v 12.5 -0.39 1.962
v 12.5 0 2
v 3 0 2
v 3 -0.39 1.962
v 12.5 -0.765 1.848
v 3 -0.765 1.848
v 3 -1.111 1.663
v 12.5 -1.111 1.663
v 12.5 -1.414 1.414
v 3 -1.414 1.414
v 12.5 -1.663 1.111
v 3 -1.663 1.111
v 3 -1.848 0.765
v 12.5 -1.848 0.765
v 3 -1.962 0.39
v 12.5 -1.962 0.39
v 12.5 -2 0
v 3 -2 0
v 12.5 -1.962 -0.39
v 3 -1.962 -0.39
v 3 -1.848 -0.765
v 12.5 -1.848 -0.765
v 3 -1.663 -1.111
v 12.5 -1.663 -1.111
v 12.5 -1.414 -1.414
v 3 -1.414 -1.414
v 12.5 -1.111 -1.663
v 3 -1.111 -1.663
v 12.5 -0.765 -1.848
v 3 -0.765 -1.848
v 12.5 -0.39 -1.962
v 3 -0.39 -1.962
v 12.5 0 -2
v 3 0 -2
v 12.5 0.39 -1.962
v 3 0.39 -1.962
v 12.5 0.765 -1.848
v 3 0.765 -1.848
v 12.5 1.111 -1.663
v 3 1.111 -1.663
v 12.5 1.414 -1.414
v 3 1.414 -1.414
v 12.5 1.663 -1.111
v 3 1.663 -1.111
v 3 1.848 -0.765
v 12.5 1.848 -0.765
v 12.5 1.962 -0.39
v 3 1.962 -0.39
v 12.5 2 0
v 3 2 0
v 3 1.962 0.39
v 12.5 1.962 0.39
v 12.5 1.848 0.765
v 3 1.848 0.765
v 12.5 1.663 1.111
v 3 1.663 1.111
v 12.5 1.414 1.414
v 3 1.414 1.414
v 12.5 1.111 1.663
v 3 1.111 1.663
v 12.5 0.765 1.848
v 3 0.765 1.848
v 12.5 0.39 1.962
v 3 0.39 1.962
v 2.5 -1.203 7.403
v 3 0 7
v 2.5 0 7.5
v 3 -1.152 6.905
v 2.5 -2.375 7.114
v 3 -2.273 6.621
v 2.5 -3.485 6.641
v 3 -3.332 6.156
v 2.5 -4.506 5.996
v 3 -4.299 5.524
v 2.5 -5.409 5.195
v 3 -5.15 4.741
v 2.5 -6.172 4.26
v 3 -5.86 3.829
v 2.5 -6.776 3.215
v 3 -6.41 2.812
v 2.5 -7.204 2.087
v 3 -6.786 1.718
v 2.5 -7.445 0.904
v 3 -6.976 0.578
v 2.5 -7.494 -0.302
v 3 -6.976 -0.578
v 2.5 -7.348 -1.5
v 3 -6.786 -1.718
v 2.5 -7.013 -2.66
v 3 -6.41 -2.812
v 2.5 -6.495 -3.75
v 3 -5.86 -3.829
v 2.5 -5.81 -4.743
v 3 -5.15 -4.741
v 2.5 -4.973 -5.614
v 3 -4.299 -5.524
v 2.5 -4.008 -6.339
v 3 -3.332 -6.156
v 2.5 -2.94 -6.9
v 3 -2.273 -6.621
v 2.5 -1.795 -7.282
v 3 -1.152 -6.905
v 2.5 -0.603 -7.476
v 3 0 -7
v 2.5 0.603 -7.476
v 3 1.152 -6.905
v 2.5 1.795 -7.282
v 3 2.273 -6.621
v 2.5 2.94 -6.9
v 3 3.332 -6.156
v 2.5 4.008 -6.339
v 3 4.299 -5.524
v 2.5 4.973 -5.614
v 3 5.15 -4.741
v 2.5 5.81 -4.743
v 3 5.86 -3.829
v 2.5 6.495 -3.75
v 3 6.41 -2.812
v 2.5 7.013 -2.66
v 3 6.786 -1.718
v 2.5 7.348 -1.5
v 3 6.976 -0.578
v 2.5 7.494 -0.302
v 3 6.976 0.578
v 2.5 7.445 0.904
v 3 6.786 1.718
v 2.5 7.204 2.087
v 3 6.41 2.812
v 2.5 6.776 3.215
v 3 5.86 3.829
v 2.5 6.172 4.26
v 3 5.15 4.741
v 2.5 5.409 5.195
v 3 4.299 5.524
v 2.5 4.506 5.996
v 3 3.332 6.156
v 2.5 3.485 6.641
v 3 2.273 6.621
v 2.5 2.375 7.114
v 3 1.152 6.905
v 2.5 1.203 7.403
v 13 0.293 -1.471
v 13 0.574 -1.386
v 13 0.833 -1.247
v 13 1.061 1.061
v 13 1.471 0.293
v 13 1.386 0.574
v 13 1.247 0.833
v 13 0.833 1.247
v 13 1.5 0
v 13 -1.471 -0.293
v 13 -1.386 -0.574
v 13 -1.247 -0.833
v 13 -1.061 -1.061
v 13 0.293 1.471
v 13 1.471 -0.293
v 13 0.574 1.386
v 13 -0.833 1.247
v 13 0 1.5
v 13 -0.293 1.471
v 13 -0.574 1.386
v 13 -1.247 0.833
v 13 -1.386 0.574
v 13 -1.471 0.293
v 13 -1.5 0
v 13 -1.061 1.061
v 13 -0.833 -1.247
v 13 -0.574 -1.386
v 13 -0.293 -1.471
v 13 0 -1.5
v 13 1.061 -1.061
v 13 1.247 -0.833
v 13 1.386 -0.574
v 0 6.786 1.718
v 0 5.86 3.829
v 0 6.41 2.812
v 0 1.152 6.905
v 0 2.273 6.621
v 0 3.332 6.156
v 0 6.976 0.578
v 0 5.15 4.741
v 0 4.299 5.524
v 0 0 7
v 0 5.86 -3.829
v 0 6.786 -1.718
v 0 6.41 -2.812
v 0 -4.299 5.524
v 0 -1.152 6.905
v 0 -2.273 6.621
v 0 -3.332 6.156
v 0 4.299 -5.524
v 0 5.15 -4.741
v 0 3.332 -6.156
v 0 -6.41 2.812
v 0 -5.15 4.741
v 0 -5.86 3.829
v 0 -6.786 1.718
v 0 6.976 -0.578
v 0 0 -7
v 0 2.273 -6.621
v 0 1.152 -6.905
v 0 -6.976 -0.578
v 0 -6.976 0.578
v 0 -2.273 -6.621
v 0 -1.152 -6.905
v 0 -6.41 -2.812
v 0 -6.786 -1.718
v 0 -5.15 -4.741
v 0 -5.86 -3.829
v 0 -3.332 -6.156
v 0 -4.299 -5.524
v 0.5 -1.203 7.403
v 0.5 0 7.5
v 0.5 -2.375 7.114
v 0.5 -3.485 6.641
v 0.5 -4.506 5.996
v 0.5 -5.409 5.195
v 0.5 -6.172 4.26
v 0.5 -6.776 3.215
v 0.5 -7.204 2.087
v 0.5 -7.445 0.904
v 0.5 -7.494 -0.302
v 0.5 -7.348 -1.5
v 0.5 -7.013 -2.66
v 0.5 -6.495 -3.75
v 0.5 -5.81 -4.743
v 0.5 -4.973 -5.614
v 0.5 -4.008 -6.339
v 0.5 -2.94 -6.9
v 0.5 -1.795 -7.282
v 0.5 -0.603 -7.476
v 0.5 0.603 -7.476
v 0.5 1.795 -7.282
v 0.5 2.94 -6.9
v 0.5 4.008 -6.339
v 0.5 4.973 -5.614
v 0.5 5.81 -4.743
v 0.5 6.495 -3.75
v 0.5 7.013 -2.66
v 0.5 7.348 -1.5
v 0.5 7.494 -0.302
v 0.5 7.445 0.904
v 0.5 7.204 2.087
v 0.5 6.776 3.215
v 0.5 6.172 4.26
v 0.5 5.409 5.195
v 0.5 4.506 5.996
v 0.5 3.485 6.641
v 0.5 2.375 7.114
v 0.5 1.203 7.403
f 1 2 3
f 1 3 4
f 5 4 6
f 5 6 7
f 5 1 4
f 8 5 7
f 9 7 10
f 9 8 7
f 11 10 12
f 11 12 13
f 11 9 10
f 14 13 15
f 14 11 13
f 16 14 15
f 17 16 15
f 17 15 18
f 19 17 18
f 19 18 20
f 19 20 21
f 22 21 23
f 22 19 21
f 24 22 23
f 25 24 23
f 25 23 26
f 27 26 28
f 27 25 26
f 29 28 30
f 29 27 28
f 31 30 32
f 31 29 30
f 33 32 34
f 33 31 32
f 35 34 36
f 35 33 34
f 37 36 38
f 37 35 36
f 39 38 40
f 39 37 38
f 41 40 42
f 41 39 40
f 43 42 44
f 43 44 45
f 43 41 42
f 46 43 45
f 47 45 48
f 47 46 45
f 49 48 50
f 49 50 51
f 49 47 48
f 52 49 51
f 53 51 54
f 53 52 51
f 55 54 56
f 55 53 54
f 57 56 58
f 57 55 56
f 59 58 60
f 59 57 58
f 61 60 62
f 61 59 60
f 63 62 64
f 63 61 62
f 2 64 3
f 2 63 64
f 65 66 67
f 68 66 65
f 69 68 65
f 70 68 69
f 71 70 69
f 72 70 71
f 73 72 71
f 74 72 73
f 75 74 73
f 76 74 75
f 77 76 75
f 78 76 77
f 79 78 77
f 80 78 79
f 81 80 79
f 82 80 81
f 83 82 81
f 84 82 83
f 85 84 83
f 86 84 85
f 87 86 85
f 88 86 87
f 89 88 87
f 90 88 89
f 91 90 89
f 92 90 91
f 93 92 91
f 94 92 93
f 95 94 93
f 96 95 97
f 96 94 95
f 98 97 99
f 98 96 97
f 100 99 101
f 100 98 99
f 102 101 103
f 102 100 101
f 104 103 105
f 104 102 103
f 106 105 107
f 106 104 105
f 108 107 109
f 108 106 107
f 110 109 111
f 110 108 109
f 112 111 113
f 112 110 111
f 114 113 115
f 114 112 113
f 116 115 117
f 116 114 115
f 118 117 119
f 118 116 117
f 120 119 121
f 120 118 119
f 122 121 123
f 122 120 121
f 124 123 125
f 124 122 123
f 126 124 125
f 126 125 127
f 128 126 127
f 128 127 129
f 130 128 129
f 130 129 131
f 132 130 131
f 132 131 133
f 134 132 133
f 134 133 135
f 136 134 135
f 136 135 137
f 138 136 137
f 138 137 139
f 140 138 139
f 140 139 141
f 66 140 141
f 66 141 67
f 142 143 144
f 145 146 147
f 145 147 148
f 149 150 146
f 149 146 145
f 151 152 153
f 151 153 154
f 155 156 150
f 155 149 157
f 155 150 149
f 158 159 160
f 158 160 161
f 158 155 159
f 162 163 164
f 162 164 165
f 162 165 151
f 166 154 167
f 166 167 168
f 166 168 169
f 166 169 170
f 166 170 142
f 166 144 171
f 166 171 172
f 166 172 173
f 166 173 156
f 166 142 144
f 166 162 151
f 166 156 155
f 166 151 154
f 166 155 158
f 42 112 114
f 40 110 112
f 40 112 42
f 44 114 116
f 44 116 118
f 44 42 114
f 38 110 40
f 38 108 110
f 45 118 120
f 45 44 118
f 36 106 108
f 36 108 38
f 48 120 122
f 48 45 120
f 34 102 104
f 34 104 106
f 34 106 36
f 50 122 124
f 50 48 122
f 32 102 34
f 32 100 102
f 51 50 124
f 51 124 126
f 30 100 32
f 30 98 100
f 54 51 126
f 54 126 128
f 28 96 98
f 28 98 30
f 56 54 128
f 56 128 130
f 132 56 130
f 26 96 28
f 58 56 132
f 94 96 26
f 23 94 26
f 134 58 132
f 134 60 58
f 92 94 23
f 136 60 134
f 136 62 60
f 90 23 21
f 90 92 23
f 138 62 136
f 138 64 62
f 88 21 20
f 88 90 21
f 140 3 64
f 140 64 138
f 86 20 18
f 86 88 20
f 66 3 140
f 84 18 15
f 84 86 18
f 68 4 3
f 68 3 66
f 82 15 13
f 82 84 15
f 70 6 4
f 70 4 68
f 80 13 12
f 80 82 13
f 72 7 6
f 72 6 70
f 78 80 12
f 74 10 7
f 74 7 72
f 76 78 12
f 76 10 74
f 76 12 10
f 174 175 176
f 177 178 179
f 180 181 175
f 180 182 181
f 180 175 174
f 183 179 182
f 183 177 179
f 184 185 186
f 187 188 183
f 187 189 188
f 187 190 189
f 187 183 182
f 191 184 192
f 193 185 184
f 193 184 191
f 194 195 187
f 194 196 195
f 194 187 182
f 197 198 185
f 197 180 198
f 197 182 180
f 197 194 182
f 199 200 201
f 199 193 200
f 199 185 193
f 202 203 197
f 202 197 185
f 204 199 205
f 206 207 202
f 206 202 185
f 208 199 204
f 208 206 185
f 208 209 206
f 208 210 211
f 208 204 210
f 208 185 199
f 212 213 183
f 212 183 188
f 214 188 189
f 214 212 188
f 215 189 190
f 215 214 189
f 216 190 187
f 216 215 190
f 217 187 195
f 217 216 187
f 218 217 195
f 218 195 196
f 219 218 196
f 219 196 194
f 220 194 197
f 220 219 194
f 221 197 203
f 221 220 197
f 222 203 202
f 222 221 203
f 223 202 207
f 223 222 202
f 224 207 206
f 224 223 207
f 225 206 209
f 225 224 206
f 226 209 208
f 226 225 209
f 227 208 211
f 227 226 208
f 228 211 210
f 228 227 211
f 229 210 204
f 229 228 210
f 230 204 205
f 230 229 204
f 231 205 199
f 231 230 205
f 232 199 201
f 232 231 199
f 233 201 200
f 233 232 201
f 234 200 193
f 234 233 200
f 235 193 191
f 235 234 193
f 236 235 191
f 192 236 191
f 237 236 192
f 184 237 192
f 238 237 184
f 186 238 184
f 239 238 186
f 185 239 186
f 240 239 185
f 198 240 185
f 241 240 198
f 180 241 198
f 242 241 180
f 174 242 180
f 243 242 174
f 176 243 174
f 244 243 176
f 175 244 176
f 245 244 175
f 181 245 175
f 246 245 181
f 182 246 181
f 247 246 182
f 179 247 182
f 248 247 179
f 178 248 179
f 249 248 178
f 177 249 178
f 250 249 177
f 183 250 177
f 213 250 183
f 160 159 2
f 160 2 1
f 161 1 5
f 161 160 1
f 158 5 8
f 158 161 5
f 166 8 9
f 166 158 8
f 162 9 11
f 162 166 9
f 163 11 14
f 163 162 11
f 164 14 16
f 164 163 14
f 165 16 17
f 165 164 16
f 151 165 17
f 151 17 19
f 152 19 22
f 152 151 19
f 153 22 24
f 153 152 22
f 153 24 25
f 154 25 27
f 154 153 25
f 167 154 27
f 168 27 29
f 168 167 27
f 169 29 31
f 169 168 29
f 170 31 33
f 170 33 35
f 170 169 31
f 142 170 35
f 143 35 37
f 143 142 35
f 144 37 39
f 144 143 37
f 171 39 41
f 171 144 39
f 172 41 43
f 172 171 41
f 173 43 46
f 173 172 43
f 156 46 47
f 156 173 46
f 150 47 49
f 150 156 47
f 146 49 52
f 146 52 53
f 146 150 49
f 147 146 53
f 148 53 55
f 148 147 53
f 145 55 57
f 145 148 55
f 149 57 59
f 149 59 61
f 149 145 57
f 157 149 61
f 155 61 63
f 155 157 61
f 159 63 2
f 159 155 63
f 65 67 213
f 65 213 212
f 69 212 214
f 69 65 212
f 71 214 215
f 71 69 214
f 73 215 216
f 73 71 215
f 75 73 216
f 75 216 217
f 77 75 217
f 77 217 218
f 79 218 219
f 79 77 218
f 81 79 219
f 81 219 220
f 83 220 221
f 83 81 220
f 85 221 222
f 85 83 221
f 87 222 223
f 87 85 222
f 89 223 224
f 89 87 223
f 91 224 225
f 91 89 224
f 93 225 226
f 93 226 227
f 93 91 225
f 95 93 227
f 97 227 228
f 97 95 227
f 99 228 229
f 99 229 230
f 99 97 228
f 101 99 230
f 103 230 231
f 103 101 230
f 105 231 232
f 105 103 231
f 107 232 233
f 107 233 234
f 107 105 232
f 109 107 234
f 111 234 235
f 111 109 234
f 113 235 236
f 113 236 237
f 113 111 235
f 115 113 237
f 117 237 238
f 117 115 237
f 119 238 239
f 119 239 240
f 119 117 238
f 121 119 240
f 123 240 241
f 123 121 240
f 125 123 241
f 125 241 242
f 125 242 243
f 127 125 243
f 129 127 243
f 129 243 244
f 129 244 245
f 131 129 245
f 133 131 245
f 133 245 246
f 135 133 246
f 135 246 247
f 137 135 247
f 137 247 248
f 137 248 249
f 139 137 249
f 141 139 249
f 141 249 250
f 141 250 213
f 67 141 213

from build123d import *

# Parameters (mm, degrees)
CHANFREIN1_SIZE = 0.5


with BuildPart() as part:
    # Esquisse1 → Révolution1 (revolve)
    with BuildSketch(Plane.XY, mode=Mode.PRIVATE) as r_volution1_sk:
        Polygon((0, 0), (0, 7.5), (3, 7.5), (3, 2), (13, 2), (13, 0), align=None)
    revolve(r_volution1_sk.sketch.rotate(Axis((-65.170410524, 0, 0), (1, 0, 0)), 90), axis=Axis((-65.170410524, 0, 0), (1, 0, 0)))

    # Chanfrein1
    chanfrein1_edges = [part.edges().sort_by_distance(p)[0] for p in [
        (13, 0, -2),
        (3, 0, -7.5),
        (0, 0, -7.5),
    ]]
    chamfer(chanfrein1_edges, length=CHANFREIN1_SIZE)


solid = part.part
